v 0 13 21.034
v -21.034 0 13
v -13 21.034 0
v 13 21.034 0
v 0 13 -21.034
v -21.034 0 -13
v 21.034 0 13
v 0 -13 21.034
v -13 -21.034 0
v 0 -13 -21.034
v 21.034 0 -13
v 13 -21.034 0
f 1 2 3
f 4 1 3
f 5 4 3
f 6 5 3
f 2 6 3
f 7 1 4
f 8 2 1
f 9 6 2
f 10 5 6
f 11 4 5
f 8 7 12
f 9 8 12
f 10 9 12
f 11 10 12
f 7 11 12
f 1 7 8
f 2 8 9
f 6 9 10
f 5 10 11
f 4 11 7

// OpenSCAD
// Open Dice basic d20
// MIT licensed. Geometry starter for a printable icosahedral die.
// Number engraving is intentionally deferred until face orientation is validated.

radius = 13;
engrave_depth = 0.45;

scale([radius, radius, radius])
  icosahedron();

module icosahedron() {
  phi = (1 + sqrt(5)) / 2;
  points = [
    [-1, phi, 0], [1, phi, 0], [-1, -phi, 0], [1, -phi, 0],
    [0, -1, phi], [0, 1, phi], [0, -1, -phi], [0, 1, -phi],
    [phi, 0, -1], [phi, 0, 1], [-phi, 0, -1], [-phi, 0, 1]
  ];
  faces = [
    [0, 11, 5], [0, 5, 1], [0, 1, 7], [0, 7, 10], [0, 10, 11],
    [1, 5, 9], [5, 11, 4], [11, 10, 2], [10, 7, 6], [7, 1, 8],
    [3, 9, 4], [3, 4, 2], [3, 2, 6], [3, 6, 8], [3, 8, 9],
    [4, 9, 5], [2, 4, 11], [6, 2, 10], [8, 6, 7], [9, 8, 1]
  ];
  polyhedron(points = points, faces = faces, convexity = 10);
}
